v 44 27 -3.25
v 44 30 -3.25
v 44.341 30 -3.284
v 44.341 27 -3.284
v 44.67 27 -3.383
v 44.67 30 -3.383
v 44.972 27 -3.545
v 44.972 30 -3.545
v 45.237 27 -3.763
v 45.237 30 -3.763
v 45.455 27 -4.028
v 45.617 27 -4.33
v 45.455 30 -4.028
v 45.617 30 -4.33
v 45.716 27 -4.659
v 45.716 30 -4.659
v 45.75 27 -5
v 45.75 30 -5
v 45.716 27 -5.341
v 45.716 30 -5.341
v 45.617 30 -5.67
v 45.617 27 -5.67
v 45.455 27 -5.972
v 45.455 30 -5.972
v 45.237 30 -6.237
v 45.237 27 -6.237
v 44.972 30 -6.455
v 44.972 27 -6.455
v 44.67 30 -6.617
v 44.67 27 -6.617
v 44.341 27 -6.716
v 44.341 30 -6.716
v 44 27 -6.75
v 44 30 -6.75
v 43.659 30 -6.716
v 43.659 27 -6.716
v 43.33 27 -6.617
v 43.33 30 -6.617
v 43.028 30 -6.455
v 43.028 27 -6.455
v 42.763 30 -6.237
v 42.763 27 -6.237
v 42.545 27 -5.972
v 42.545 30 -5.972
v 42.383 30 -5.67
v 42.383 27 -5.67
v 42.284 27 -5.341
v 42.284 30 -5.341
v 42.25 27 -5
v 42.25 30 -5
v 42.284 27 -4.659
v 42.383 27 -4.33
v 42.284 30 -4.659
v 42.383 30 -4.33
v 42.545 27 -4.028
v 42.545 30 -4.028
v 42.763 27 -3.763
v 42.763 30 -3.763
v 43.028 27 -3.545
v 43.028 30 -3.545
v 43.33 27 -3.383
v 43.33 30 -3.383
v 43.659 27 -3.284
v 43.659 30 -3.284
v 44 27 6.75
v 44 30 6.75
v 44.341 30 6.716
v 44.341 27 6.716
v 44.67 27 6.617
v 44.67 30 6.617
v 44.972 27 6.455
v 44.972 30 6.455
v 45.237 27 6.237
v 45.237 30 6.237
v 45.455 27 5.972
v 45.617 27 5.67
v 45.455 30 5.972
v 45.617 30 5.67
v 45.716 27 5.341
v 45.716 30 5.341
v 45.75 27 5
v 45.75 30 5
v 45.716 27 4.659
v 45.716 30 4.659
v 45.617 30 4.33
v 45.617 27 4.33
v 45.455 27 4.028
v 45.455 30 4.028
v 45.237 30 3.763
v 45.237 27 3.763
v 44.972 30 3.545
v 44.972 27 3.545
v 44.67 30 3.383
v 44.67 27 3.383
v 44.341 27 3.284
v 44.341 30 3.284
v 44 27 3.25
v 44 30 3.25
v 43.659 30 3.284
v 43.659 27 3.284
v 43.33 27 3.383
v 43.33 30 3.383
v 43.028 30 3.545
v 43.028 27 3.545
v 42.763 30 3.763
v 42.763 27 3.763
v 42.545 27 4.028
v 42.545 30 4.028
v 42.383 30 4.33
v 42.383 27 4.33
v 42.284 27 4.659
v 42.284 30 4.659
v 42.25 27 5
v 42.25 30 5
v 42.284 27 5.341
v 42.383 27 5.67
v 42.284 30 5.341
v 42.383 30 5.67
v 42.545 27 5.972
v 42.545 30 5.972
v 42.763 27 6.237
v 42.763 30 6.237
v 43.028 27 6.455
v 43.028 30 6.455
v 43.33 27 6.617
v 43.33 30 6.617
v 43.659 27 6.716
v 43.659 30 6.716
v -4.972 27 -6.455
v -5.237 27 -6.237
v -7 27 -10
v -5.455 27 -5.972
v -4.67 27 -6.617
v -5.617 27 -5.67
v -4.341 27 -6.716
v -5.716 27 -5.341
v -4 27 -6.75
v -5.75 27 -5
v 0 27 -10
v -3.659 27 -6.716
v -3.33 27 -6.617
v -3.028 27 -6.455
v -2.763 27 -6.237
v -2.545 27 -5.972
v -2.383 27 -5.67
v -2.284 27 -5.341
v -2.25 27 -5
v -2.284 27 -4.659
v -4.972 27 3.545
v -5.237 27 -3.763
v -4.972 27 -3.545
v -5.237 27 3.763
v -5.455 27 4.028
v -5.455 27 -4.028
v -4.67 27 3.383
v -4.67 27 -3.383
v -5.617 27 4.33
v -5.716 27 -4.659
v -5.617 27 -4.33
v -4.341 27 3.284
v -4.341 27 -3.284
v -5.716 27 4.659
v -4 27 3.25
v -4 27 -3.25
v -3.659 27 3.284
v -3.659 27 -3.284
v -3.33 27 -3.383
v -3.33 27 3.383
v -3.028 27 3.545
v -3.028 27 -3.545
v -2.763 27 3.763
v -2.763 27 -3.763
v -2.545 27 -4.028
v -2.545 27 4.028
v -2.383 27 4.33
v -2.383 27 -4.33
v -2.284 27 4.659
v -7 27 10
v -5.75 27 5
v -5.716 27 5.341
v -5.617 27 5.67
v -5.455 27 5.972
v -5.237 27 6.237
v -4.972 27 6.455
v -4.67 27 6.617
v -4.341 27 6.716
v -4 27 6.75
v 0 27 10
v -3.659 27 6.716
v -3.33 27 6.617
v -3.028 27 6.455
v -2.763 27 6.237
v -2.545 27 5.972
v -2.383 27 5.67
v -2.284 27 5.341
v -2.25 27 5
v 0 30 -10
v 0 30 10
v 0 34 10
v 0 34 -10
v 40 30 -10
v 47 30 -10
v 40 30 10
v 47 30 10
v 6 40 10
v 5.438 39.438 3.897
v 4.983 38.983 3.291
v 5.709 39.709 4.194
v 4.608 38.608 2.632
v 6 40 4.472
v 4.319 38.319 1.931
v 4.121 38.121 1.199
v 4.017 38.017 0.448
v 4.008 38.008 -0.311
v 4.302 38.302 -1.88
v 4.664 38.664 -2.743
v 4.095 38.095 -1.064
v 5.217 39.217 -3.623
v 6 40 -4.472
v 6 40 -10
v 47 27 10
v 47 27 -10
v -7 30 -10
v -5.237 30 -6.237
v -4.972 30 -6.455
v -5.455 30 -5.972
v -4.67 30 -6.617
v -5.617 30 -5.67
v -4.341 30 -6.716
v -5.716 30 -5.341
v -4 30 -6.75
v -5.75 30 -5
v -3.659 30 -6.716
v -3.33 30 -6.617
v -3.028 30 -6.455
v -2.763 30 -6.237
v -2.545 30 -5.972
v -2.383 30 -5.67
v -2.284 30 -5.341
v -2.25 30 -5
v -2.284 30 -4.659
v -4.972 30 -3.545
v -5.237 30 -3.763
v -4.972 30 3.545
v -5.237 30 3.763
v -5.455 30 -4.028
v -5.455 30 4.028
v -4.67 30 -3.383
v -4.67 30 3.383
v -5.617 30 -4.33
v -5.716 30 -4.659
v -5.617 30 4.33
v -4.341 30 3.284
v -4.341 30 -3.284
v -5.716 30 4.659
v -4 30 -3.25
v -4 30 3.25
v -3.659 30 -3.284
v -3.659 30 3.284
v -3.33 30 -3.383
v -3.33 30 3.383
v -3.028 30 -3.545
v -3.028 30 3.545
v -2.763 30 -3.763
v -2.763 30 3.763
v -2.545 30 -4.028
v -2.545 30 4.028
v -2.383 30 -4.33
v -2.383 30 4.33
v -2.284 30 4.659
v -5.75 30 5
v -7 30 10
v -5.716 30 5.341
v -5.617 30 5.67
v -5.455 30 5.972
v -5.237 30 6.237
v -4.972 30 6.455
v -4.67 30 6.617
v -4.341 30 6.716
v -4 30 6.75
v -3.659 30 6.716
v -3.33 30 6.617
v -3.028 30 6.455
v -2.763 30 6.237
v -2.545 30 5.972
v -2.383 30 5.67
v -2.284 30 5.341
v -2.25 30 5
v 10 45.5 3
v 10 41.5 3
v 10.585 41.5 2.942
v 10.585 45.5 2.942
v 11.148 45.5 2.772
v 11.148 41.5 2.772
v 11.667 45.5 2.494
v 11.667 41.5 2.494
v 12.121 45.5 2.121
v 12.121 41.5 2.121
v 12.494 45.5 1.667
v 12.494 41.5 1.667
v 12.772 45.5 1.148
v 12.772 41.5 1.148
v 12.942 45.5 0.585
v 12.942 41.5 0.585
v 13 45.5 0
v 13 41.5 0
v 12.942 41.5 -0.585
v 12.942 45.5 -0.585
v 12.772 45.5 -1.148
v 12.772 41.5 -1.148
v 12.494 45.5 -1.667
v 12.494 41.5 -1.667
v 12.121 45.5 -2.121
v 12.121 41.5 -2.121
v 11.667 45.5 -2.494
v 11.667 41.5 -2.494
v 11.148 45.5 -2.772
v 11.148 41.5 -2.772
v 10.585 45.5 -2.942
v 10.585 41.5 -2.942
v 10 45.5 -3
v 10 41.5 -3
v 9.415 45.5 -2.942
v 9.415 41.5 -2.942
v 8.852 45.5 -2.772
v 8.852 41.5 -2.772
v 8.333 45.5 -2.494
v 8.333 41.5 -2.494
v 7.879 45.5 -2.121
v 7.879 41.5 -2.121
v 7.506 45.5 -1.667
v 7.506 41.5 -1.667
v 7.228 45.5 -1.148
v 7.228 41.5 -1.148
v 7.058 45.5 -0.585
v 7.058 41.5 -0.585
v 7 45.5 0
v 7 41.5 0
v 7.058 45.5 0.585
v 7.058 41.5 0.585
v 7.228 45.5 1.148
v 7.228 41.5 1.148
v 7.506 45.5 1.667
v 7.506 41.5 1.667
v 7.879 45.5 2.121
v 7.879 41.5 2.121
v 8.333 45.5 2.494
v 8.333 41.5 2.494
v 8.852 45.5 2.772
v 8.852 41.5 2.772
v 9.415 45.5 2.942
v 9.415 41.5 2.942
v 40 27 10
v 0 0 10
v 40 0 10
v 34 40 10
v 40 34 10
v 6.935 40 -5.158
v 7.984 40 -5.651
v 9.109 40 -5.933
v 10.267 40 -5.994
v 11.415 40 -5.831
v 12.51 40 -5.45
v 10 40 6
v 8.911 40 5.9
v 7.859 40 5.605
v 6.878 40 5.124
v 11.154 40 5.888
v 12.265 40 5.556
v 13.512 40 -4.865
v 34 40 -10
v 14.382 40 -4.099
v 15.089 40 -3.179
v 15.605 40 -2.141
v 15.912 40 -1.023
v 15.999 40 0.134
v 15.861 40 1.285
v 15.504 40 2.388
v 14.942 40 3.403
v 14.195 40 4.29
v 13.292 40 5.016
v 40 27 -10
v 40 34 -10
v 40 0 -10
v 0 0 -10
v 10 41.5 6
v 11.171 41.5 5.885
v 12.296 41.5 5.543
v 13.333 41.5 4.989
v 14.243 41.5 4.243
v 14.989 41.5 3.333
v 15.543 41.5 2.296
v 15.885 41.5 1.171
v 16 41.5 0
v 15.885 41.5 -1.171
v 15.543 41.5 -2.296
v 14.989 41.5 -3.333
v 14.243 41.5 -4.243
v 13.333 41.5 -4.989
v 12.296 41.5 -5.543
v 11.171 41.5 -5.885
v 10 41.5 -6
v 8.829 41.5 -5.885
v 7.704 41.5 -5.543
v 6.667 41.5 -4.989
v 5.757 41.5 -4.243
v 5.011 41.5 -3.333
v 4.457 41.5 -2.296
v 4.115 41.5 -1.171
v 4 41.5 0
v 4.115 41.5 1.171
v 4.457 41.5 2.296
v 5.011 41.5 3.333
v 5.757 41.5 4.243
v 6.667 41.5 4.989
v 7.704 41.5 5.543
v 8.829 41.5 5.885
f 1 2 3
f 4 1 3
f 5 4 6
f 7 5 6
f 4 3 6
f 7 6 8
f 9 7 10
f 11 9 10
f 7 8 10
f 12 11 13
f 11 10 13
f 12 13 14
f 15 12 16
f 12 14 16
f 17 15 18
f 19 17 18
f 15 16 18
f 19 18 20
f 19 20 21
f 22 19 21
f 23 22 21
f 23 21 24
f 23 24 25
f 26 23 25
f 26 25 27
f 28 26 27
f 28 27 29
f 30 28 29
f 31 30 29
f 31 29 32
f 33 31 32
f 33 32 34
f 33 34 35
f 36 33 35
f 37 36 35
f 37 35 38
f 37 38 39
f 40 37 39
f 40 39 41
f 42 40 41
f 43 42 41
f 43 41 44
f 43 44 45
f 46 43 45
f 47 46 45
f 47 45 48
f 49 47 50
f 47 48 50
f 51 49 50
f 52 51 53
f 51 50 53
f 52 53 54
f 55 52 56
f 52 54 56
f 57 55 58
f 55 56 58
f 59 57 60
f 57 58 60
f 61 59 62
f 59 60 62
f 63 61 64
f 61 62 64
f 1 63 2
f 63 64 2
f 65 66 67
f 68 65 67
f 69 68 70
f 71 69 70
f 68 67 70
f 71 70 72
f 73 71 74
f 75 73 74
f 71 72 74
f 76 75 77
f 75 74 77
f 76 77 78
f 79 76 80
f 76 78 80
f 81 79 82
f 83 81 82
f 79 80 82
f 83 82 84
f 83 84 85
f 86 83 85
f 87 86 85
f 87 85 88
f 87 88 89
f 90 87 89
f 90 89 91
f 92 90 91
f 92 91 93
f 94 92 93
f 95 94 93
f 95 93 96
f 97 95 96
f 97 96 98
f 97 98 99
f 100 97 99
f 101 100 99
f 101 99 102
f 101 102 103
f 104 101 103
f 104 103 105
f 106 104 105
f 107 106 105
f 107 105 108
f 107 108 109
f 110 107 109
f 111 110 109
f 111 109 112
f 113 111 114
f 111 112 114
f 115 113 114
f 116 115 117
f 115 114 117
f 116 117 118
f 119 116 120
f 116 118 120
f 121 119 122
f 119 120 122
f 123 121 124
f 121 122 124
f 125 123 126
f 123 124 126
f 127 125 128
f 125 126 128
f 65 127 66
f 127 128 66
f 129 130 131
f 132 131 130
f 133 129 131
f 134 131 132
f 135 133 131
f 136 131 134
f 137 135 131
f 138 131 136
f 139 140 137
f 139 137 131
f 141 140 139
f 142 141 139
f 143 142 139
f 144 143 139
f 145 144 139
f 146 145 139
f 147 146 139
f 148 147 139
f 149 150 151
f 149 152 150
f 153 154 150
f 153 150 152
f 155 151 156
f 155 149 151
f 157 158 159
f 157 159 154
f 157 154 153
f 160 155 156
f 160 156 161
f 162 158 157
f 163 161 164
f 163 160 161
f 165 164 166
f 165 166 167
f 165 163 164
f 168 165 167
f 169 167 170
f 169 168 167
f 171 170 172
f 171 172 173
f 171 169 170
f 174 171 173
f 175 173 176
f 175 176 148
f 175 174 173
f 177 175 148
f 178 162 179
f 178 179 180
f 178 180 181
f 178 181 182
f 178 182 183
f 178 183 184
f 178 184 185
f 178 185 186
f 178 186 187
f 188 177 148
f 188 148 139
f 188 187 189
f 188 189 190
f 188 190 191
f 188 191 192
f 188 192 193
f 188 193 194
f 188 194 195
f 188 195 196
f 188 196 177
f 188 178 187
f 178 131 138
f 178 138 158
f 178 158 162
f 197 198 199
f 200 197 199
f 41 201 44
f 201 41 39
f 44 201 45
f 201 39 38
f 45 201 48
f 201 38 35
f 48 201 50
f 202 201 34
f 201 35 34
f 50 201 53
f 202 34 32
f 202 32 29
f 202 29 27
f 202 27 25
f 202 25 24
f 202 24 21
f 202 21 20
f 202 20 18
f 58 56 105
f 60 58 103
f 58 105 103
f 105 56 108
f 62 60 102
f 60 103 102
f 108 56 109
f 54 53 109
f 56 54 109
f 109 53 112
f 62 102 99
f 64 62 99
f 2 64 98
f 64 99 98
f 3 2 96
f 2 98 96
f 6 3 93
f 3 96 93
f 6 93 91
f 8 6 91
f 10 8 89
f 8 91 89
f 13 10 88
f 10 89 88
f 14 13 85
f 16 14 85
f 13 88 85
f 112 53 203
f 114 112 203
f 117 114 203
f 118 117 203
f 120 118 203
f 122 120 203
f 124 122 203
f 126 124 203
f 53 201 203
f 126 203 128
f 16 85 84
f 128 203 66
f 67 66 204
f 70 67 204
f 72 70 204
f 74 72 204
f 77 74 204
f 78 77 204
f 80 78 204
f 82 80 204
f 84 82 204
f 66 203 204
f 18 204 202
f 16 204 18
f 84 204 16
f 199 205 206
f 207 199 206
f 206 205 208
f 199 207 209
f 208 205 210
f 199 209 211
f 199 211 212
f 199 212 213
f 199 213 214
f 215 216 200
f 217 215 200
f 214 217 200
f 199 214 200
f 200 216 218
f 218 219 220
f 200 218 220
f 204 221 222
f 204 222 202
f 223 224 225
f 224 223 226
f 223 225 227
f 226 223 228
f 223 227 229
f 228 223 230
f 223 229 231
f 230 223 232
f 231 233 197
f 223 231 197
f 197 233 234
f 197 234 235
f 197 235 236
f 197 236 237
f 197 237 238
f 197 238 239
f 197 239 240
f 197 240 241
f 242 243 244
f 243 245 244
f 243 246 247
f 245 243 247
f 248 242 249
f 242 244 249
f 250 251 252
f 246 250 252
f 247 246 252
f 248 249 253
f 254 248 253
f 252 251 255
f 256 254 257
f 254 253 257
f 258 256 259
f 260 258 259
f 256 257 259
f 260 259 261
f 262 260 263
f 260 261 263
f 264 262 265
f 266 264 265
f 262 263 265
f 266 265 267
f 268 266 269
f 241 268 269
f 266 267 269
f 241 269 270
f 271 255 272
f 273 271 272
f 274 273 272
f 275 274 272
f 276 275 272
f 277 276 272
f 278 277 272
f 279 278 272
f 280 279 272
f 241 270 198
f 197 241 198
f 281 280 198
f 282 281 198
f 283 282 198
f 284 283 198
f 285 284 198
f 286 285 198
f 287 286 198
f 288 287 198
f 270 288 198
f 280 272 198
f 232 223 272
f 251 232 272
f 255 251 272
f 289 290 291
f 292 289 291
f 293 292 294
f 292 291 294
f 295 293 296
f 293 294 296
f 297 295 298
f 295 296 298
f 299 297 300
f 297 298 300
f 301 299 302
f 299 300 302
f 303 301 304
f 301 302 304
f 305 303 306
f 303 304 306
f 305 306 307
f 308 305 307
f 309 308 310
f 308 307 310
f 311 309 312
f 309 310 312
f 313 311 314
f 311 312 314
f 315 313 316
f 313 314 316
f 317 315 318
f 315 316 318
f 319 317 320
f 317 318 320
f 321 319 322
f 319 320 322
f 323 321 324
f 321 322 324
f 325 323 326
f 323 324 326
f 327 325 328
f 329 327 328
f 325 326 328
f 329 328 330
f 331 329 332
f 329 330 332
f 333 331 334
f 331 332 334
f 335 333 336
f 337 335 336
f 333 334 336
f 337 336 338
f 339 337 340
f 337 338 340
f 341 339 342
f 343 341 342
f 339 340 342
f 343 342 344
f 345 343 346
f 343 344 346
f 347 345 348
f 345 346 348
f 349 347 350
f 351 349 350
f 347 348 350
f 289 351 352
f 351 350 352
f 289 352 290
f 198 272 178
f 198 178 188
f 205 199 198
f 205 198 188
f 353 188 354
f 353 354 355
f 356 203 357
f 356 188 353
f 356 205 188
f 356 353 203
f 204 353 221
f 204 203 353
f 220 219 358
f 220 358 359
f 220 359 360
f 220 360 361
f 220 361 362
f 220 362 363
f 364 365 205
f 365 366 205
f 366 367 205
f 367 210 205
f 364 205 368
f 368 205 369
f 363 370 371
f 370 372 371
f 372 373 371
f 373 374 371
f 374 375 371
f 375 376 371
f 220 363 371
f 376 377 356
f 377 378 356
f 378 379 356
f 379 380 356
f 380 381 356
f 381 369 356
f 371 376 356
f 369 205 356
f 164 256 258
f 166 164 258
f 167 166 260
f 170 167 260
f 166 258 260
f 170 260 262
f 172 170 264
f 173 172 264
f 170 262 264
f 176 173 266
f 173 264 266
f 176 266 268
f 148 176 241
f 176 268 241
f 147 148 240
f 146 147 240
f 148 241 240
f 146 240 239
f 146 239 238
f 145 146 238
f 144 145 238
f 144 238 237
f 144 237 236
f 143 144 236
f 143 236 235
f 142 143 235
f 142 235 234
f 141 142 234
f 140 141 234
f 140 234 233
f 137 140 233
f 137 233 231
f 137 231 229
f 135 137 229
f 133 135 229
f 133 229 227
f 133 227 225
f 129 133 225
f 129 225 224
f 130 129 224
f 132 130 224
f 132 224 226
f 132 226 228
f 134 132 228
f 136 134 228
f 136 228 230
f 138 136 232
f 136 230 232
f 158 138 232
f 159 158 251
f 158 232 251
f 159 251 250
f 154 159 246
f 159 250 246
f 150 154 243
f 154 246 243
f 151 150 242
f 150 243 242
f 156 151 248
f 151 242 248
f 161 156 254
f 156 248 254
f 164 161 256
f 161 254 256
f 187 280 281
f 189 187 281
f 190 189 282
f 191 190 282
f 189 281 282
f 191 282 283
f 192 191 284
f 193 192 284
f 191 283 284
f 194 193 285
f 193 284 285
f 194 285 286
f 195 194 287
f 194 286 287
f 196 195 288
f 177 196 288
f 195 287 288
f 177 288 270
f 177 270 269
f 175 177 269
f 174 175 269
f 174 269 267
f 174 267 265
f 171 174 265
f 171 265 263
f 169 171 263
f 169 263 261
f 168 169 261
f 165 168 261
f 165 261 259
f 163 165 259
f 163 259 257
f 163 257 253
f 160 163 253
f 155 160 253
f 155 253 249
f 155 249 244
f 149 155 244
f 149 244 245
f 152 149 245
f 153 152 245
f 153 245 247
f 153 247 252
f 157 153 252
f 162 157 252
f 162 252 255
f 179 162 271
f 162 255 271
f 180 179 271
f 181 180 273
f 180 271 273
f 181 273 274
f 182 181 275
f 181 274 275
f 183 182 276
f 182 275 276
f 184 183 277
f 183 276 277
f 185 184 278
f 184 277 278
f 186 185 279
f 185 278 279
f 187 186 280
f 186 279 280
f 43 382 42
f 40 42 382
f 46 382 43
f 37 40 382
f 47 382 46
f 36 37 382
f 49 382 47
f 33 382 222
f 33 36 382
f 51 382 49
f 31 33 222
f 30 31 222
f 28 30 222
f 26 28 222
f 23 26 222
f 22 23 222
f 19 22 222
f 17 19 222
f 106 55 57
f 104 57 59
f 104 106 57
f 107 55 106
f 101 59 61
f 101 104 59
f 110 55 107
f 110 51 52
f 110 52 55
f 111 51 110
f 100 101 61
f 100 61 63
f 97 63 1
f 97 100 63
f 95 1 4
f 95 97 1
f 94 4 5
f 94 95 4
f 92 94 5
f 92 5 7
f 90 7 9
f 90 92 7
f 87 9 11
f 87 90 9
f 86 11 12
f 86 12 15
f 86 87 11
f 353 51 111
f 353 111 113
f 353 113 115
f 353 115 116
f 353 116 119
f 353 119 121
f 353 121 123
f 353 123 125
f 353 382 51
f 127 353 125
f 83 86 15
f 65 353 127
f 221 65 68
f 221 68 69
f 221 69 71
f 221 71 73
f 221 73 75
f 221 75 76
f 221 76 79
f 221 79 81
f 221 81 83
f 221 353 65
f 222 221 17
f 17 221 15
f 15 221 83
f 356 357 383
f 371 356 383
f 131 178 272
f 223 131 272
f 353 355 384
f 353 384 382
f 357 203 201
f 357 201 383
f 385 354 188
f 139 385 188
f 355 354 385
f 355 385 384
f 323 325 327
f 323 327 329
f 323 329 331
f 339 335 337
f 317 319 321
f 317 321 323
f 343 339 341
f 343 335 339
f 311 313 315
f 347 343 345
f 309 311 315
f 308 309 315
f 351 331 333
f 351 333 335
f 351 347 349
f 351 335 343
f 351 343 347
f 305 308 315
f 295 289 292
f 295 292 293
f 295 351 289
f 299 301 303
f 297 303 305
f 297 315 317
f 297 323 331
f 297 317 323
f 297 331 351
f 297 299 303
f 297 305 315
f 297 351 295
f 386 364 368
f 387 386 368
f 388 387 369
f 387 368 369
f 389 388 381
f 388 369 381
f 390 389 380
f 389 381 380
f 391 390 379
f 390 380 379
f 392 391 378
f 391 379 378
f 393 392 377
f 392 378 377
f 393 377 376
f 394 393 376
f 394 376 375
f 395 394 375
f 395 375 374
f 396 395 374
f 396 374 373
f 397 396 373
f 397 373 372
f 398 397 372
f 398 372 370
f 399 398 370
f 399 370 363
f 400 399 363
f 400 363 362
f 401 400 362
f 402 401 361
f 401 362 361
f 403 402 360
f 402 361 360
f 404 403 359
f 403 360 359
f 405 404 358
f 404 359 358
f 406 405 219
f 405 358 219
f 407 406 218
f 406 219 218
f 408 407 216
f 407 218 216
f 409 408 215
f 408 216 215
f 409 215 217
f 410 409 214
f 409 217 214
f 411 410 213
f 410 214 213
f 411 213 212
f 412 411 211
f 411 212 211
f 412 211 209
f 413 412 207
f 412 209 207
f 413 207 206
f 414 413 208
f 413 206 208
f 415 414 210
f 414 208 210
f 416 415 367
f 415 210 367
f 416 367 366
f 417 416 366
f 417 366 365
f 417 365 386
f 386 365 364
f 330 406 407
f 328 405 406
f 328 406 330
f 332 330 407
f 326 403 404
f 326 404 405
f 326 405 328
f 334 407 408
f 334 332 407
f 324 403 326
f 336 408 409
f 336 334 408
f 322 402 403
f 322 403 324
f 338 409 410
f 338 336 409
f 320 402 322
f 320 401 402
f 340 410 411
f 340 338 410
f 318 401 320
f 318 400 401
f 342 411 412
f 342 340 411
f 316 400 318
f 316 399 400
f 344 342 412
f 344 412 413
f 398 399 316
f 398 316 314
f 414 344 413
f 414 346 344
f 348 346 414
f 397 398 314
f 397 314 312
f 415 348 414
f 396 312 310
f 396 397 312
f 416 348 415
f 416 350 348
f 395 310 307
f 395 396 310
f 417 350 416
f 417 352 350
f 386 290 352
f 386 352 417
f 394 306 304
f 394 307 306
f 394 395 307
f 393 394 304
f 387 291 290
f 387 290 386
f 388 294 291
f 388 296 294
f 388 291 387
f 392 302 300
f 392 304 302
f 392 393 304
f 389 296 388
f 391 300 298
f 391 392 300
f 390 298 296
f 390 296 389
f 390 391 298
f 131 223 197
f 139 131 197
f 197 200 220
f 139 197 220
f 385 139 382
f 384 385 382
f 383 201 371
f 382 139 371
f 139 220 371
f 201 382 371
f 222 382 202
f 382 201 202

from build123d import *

# Parameters (mm, degrees)
SKETCH_1_W           = 40
SKETCH_1_H           = 40
EXTRUDE_1_DEPTH      = 10
SKETCH_2_W           = 54
SKETCH_2_H           = 3
EXTRUDE_2_DEPTH      = 10
CHAMFER_1_SIZE       = 6
EXTRUDE_3_DEPTH      = 1.5
EXTRUDE_3_DEPTH_BACK = 20
SKETCH_4_R           = 6
SKETCH_5_R           = 3
EXTRUDE_4_DEPTH      = 4
SKETCH_6_R           = 1.75
CUT_EXTRUDE_1_DEPTH  = 57.648036153


with BuildPart() as part:
    # 草图1 → 凸台-拉伸1 (new, symmetric)
    with BuildSketch(Plane.XY):
        with Locations((20, 20)):
            Rectangle(SKETCH_1_W, SKETCH_1_H)
    extrude(amount=EXTRUDE_1_DEPTH, both=True)

    # 草图2 → 凸台-拉伸2 (add, symmetric)
    with BuildSketch(Plane.XY):
        with Locations((20, 28.5)):
            Rectangle(SKETCH_2_W, SKETCH_2_H)
    extrude(amount=EXTRUDE_2_DEPTH, both=True)

    # 倒角1
    chamfer_1_edges = [part.edges().sort_by_distance(p)[0] for p in [
        (0, 40, 0),
        (40, 40, 0),
    ]]
    chamfer(chamfer_1_edges, length=CHAMFER_1_SIZE)

    # 草图4 → 凸台-拉伸3 (add, two sides: drawn at the far end of the back side and taken through both)
    with BuildSketch(Plane(origin=(0, 40, 0), x_dir=(1, 0, 0), z_dir=(0, 1, 0)).offset(-EXTRUDE_3_DEPTH_BACK)):
        with Locations(Location((10, 0, 0), (0, 0, 270))):
            Circle(SKETCH_4_R)
    extrude(amount=EXTRUDE_3_DEPTH + EXTRUDE_3_DEPTH_BACK)

    # 草图5 → 凸台-拉伸4 (add)
    with BuildSketch(Plane(origin=(0, 41.5, 0), x_dir=(1, 0, 0), z_dir=(0, 1, 0))):
        with Locations(Location((10, 0, 0), (0, 0, 270))):
            Circle(SKETCH_5_R)
    extrude(amount=EXTRUDE_4_DEPTH)

    # 草图6 → 切除-拉伸1 (cut, through all)
    with BuildSketch(Plane(origin=(0, 30, 0), x_dir=(1, 0, 0), z_dir=(0, 1, 0))):
        with Locations(Location((-4, 5, 0), (0, 0, 270))):
            Circle(SKETCH_6_R)
        with Locations(Location((-4, -5, 0), (0, 0, 270))):
            Circle(SKETCH_6_R)
        with Locations(Location((44, 5, 0), (0, 0, 270))):
            Circle(SKETCH_6_R)
        with Locations(Location((44, -5, 0), (0, 0, 270))):
            Circle(SKETCH_6_R)
    extrude(amount=-CUT_EXTRUDE_1_DEPTH, mode=Mode.SUBTRACT)


solid = part.part
